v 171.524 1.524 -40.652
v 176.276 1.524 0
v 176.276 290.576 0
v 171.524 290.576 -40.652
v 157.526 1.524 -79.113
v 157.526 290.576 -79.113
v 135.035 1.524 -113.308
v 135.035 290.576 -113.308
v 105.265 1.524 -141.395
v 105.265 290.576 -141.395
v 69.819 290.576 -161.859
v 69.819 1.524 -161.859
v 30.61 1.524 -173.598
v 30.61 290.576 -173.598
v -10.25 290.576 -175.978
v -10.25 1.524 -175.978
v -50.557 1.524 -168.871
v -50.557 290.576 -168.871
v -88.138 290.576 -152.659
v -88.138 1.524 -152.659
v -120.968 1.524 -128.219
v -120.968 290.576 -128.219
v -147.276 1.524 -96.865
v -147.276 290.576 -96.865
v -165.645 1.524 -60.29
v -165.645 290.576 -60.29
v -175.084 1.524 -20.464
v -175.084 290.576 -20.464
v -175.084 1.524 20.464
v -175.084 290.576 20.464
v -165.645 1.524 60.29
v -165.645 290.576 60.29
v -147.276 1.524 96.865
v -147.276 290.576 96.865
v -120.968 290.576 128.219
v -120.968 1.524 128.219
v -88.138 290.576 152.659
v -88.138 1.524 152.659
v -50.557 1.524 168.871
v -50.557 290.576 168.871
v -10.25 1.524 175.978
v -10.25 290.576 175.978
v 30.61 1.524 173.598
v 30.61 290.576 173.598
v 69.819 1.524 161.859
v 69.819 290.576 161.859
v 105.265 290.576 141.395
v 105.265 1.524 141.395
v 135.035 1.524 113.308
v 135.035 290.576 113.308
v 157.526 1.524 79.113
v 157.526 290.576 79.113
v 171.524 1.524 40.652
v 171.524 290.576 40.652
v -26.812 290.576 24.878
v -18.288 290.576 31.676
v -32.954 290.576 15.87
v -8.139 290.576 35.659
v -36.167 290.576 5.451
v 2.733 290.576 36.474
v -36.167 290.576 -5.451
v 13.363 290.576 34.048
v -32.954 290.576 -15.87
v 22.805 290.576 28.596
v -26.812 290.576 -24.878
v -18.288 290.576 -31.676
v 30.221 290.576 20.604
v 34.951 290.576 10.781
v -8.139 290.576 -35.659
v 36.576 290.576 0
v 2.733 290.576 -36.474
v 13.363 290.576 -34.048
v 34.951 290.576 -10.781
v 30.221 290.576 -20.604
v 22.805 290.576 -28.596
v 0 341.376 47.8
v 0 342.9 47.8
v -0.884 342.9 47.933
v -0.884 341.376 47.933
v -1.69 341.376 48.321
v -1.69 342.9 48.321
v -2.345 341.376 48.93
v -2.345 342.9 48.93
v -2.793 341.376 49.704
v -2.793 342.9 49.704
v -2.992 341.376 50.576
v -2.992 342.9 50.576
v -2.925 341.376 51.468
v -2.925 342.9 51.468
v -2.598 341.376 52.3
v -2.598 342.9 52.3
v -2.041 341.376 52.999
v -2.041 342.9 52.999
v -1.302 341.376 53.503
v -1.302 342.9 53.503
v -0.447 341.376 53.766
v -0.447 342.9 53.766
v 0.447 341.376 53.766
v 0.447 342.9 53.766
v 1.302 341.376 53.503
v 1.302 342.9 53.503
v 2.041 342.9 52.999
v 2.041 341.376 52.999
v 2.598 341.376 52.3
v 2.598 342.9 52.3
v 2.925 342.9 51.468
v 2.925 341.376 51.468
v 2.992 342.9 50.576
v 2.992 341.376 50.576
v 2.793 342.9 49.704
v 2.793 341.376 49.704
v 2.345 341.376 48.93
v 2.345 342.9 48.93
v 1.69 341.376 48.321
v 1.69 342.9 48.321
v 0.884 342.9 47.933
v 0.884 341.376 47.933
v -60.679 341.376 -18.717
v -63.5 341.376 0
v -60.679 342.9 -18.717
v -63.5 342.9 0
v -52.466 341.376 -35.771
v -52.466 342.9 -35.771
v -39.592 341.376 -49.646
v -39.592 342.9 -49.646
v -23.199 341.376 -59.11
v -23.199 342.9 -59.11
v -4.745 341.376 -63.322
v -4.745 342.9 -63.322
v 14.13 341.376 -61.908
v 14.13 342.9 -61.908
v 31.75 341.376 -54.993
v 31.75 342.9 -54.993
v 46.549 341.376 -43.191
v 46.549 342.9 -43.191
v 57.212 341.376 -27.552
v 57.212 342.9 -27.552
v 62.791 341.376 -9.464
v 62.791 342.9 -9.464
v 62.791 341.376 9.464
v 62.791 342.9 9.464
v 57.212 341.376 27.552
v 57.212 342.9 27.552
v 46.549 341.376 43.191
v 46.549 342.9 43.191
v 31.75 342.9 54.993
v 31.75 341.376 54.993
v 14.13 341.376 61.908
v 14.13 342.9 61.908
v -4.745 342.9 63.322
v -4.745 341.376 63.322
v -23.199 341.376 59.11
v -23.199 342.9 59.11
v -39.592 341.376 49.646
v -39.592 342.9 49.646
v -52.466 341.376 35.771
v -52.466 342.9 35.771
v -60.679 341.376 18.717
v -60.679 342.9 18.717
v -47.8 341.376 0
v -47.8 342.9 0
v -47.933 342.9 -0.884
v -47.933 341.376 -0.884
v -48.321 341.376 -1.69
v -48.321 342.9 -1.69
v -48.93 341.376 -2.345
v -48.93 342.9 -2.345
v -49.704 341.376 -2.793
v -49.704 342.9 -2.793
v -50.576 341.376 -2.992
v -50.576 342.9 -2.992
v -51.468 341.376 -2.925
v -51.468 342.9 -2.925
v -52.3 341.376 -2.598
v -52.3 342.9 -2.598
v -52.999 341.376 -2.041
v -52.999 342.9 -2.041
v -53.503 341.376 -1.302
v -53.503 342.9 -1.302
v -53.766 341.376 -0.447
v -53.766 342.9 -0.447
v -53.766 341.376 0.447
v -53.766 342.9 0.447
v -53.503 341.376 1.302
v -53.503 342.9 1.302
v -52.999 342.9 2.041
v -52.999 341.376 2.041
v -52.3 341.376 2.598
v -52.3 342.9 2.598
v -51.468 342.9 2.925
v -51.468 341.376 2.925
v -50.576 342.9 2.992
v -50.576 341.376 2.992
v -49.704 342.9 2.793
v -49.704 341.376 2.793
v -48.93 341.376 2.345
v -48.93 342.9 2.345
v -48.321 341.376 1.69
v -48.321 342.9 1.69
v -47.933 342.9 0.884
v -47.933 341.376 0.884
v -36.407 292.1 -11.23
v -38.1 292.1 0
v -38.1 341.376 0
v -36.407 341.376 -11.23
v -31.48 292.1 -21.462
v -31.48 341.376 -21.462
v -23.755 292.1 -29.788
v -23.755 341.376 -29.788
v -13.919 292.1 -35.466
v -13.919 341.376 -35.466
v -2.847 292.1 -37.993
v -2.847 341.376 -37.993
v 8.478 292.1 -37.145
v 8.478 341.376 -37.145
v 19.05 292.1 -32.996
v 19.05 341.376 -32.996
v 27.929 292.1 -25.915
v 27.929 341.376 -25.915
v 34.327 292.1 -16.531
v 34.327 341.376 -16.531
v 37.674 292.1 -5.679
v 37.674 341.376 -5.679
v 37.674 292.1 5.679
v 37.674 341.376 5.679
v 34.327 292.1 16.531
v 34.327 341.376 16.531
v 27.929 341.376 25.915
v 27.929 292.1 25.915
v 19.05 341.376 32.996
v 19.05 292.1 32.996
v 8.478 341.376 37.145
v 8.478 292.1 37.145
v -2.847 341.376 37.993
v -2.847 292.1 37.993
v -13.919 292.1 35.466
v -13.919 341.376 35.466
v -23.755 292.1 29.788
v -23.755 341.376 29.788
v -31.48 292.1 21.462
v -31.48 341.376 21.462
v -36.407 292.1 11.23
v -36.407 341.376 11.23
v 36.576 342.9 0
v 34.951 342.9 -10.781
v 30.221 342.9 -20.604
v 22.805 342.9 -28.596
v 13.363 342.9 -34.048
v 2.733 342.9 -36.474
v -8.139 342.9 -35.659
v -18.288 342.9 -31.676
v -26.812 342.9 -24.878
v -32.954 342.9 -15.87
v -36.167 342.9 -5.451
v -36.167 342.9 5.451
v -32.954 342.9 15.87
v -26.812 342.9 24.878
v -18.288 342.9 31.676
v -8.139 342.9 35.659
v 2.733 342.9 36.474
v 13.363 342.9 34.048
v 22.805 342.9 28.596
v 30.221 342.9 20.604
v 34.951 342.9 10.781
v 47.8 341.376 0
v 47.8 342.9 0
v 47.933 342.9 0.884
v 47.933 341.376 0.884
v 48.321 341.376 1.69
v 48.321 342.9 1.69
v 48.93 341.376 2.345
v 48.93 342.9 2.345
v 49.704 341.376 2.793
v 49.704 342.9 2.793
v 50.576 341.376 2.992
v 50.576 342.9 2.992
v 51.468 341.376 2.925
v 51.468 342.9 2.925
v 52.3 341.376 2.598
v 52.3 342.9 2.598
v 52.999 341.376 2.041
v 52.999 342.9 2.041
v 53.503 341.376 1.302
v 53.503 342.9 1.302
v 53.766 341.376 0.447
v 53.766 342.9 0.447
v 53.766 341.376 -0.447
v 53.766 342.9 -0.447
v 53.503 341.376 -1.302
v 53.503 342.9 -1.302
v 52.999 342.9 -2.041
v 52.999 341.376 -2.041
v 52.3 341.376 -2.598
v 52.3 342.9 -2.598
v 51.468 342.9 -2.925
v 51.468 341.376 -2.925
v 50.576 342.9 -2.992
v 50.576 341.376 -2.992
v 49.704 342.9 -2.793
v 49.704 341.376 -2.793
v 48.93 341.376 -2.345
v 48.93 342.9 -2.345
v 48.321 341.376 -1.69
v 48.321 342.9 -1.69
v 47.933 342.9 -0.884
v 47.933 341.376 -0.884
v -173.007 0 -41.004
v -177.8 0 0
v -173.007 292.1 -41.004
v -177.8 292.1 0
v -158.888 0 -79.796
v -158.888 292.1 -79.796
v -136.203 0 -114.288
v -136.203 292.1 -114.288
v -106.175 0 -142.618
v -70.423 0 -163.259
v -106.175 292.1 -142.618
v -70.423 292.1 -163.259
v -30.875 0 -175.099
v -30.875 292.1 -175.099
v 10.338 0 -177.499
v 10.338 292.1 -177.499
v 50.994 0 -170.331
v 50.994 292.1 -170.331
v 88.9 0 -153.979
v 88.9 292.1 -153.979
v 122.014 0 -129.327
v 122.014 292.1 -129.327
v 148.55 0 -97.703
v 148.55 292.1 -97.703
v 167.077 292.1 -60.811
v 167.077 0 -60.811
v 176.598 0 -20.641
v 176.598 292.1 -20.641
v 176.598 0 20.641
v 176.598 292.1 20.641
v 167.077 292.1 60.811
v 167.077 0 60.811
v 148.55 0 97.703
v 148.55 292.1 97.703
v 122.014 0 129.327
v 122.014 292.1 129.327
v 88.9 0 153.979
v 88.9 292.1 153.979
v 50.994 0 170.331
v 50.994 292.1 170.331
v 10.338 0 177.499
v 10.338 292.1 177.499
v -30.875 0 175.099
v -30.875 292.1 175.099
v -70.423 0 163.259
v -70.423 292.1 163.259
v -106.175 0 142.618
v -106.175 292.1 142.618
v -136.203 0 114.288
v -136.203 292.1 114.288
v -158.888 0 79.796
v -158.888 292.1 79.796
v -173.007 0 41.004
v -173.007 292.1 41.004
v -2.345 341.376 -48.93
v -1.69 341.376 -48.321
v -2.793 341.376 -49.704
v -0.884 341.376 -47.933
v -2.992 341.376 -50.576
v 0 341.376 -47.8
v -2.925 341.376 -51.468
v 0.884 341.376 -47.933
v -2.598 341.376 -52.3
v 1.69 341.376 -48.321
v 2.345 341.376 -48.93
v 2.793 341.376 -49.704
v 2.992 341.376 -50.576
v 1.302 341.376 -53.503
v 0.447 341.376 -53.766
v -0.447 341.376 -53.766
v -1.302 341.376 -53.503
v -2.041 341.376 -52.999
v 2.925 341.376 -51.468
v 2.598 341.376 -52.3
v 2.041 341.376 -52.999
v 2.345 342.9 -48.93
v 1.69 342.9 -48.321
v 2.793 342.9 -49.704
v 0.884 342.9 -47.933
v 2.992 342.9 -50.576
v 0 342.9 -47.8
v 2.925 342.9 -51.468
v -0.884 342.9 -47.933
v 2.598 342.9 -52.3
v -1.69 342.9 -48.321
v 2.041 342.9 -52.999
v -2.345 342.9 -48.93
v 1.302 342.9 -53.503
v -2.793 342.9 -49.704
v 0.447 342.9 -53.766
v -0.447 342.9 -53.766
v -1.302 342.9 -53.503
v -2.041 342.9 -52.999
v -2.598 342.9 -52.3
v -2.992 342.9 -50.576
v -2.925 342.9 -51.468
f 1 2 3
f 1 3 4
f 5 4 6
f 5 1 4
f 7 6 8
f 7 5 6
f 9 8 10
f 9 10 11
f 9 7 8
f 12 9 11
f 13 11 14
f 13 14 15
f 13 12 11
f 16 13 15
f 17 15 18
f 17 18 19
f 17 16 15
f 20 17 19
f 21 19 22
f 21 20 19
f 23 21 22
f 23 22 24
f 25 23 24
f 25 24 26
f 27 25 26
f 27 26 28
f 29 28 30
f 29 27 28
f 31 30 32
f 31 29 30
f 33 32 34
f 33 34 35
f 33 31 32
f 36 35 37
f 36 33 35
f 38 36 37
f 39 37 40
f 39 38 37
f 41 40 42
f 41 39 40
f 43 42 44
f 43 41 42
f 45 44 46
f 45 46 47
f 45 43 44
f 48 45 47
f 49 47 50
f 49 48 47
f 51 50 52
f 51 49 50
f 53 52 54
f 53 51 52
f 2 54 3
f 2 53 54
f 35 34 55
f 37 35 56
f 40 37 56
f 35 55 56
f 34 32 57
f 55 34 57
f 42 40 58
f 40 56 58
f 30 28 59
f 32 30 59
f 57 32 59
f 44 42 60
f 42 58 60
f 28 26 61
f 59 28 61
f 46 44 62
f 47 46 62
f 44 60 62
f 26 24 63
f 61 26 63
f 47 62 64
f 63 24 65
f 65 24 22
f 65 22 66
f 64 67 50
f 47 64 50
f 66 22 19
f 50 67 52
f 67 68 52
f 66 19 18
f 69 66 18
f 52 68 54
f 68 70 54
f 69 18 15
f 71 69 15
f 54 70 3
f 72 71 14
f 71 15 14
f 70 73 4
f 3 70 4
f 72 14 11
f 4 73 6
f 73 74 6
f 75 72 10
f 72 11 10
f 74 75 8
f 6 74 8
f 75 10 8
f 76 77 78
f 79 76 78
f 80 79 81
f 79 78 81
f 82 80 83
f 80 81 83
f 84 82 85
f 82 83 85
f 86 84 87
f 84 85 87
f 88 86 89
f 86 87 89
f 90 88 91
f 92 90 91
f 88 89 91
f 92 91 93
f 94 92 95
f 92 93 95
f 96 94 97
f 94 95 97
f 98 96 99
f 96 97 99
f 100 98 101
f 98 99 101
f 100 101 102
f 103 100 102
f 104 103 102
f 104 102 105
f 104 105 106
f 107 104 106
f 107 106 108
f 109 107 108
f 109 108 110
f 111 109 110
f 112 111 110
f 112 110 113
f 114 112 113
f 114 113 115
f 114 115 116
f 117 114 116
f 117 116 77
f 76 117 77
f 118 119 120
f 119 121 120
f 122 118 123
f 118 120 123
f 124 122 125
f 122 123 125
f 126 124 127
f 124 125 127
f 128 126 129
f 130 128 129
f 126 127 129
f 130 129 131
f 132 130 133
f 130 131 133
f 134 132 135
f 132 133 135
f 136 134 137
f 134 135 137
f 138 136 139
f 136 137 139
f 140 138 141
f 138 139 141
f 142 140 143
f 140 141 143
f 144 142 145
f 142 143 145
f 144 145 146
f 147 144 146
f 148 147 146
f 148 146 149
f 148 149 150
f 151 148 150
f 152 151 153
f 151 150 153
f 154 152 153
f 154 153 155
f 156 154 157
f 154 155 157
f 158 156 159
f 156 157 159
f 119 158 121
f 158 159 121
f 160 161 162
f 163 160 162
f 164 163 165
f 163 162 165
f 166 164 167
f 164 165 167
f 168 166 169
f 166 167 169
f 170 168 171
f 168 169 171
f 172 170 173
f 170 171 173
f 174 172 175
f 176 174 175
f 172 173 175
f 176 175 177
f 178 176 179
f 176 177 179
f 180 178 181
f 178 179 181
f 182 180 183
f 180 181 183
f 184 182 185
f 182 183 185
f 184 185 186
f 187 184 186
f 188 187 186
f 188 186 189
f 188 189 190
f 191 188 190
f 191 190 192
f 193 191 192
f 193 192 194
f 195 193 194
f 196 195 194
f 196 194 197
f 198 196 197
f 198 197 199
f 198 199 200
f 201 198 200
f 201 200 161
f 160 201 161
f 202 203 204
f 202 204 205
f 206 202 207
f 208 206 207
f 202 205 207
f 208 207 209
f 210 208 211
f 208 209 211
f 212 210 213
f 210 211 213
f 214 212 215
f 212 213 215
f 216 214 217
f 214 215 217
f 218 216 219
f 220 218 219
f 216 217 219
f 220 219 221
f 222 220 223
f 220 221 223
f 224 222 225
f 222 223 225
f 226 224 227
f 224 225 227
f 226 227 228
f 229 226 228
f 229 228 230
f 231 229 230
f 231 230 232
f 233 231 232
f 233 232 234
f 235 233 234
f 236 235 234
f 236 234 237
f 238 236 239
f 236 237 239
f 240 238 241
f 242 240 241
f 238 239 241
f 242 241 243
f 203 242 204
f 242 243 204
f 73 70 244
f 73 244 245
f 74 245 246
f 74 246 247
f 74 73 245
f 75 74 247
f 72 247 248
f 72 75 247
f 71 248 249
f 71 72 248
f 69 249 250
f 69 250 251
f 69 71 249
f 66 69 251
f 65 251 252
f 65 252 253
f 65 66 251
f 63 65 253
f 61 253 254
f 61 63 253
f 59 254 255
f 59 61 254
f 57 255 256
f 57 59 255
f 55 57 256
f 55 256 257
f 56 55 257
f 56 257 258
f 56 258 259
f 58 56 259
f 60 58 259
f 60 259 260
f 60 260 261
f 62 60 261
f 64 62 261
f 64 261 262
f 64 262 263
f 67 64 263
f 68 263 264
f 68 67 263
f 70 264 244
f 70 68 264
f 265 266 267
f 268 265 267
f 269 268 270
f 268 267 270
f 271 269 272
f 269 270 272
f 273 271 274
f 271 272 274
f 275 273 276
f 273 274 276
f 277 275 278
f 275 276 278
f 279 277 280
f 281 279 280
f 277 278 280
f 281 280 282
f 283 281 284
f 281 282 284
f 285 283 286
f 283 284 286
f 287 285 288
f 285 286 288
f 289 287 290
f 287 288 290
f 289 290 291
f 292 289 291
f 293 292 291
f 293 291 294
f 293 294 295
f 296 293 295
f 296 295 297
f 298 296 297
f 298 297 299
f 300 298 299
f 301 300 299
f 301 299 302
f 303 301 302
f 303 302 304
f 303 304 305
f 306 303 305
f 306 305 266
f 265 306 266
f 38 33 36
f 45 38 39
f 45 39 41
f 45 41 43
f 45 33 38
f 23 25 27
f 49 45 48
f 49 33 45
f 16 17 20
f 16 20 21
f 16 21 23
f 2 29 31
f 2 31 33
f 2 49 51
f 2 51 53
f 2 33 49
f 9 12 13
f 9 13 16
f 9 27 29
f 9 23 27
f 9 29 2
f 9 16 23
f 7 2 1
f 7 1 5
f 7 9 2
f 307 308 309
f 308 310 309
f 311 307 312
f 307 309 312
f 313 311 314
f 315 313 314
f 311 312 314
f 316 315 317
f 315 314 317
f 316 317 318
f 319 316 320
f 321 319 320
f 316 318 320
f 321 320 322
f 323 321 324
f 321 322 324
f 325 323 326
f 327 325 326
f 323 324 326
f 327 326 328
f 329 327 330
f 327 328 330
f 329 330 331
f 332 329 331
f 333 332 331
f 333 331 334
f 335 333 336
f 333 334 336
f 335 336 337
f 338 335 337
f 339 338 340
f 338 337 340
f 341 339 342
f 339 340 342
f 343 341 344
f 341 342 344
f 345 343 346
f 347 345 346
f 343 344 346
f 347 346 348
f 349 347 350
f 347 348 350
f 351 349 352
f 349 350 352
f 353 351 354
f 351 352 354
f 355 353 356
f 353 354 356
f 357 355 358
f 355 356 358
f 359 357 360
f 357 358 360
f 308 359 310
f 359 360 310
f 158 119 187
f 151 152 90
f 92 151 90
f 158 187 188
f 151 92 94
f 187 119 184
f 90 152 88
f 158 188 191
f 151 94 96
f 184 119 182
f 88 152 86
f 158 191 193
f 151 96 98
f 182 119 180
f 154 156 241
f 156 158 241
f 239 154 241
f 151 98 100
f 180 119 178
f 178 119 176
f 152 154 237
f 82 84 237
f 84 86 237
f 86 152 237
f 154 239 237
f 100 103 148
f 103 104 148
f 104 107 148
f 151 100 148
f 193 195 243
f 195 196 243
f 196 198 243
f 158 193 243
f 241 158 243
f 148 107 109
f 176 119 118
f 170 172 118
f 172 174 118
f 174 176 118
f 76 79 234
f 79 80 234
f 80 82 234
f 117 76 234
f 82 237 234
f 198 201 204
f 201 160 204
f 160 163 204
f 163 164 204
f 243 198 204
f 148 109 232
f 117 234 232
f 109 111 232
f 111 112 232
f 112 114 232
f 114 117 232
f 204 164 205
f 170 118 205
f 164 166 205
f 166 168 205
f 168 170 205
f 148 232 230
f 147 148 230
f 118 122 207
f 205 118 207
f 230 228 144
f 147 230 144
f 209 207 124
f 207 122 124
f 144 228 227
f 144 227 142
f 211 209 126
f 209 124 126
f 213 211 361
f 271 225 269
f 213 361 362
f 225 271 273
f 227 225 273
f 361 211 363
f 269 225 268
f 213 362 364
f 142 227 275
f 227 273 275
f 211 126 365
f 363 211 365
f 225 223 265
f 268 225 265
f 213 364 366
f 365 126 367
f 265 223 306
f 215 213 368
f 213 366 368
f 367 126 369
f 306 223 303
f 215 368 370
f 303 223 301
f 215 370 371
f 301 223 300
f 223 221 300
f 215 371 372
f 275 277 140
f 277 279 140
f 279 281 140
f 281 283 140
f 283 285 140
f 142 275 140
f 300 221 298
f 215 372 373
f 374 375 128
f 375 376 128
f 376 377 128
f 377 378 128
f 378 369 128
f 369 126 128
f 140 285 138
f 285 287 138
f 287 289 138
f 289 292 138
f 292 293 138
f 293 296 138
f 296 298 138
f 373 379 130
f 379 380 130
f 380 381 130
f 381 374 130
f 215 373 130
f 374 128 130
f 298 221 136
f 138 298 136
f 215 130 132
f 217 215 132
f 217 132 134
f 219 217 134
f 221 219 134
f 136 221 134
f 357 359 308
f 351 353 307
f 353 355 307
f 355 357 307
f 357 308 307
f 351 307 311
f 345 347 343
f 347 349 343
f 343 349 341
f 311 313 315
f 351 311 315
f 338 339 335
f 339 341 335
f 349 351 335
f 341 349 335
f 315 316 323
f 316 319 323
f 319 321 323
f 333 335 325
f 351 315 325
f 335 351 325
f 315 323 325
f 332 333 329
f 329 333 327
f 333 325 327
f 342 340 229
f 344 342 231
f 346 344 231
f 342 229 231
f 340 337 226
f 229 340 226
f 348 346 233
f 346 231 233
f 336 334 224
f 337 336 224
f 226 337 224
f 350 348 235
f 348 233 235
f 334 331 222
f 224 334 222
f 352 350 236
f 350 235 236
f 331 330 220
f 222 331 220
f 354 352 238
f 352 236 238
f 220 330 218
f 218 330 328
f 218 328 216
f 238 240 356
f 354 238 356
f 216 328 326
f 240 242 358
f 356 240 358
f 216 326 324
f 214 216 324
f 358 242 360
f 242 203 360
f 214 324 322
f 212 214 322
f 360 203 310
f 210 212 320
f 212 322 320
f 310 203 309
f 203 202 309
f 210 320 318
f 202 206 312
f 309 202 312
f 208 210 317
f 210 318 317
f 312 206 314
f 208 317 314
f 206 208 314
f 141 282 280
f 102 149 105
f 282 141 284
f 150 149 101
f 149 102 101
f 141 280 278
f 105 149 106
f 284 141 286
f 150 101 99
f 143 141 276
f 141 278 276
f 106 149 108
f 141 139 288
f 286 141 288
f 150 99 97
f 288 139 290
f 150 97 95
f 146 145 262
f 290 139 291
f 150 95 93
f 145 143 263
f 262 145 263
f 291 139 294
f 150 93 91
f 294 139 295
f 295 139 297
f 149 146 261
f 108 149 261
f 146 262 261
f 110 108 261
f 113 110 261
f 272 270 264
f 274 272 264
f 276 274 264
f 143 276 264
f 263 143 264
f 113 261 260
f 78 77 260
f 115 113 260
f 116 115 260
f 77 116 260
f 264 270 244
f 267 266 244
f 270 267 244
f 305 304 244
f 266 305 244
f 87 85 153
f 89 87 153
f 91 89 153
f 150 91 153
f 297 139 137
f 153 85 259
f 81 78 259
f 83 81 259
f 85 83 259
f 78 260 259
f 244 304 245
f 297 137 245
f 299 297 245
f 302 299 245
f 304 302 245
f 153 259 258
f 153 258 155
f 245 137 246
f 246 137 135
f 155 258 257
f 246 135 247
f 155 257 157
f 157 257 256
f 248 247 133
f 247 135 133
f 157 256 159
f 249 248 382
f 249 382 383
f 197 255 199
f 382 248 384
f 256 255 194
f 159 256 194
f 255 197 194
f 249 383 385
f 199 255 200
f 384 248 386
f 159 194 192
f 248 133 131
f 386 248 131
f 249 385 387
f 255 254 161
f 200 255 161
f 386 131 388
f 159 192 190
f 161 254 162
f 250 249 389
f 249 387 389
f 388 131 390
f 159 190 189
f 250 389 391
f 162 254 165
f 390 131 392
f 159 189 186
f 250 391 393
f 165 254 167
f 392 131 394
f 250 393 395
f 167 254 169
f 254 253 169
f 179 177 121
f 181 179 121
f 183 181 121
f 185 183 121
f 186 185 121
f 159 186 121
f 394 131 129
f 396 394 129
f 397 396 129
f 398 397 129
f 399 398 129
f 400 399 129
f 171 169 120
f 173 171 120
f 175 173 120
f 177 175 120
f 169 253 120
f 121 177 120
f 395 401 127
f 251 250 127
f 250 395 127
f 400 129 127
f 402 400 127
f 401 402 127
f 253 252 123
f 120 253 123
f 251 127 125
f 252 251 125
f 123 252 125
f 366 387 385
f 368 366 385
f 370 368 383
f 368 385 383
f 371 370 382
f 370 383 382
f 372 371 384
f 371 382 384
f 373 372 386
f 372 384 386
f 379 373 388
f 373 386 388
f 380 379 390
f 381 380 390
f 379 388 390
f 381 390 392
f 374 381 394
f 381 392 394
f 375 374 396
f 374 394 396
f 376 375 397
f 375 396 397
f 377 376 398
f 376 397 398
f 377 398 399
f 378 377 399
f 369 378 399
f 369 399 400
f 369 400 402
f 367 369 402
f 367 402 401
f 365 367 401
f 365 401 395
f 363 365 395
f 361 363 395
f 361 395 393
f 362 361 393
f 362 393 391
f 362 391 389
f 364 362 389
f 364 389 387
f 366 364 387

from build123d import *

# Parameters (mm, degrees)
SHELL2_START       = 1.524
SHELL2_OUTLINE_R   = 176.276
SHELL2_DEPTH       = 289.052
SHELL2_START_2     = 290.576
SHELL2_2_OUTLINE_R = 36.576
SHELL2_2_DEPTH     = 52.324
CUT_EXTRUDE1_REACH = 427.213
SKETCH2_R          = 2.999994
CIRPATTERN1_COUNT  = 4


# Read off the part's stored shape, not the designer's step: Shell2
with BuildPart() as part:
    # Sketch1 → Revolve1 (revolve)
    with BuildSketch(Plane.XY, mode=Mode.PRIVATE) as revolve1_sk:
        Polygon((0, 0), (177.8, 0), (177.8, 292.1), (38.1, 292.1), (38.1, 341.376), (63.5, 341.376), (63.5, 342.9), (0, 342.9), align=None)
    revolve(revolve1_sk.sketch.rotate(Axis((0, 342.9, 0), (0, -1, 0)), 180), axis=Axis((0, 342.9, 0), (0, -1, 0)))

    # Shell2 outline → Shell2 (cut)
    with BuildSketch(Plane(origin=(0, 0, 0), x_dir=(1, 0, 0), z_dir=(0, 1, 0)).offset(SHELL2_START)):
        Circle(SHELL2_OUTLINE_R)
    extrude(amount=SHELL2_DEPTH, mode=Mode.SUBTRACT)

    # Shell2 2 outline → Shell2 2 (cut)
    with BuildSketch(Plane(origin=(0, 0, 0), x_dir=(1, 0, 0), z_dir=(0, 1, 0)).offset(SHELL2_START_2)):
        Circle(SHELL2_2_OUTLINE_R)
    extrude(amount=SHELL2_2_DEPTH, mode=Mode.SUBTRACT)

    # Sketch2 → Cut-Extrude1 (cut, up to next)
    with BuildSketch(Plane(origin=(0, 342.9, 0), x_dir=(1, 0, 0), z_dir=(0, 1, 0)), mode=Mode.PRIVATE) as cut_extrude1_sk1:
        with Locations(Location((50.8, 0, 0), (0, 0, 180))):
            Circle(SKETCH2_R)
    cut_extrude1_tool1 = extrude(cut_extrude1_sk1.sketch, amount=-CUT_EXTRUDE1_REACH, mode=Mode.PRIVATE) & part.part
    cut_extrude1 = cut_extrude1_tool1.solids().sort_by_distance((50.8, 342.9, 0))[0]
    add(cut_extrude1, mode=Mode.SUBTRACT)

    # CirPattern1: Cut-Extrude1 ×4 about axis
    cirpattern1_axis = Axis((0, 0, 0), (0, 1, 0))
    for i in range(1, CIRPATTERN1_COUNT):
        add(cut_extrude1.rotate(cirpattern1_axis, i * 360 / CIRPATTERN1_COUNT), mode=Mode.SUBTRACT)


solid = part.part
